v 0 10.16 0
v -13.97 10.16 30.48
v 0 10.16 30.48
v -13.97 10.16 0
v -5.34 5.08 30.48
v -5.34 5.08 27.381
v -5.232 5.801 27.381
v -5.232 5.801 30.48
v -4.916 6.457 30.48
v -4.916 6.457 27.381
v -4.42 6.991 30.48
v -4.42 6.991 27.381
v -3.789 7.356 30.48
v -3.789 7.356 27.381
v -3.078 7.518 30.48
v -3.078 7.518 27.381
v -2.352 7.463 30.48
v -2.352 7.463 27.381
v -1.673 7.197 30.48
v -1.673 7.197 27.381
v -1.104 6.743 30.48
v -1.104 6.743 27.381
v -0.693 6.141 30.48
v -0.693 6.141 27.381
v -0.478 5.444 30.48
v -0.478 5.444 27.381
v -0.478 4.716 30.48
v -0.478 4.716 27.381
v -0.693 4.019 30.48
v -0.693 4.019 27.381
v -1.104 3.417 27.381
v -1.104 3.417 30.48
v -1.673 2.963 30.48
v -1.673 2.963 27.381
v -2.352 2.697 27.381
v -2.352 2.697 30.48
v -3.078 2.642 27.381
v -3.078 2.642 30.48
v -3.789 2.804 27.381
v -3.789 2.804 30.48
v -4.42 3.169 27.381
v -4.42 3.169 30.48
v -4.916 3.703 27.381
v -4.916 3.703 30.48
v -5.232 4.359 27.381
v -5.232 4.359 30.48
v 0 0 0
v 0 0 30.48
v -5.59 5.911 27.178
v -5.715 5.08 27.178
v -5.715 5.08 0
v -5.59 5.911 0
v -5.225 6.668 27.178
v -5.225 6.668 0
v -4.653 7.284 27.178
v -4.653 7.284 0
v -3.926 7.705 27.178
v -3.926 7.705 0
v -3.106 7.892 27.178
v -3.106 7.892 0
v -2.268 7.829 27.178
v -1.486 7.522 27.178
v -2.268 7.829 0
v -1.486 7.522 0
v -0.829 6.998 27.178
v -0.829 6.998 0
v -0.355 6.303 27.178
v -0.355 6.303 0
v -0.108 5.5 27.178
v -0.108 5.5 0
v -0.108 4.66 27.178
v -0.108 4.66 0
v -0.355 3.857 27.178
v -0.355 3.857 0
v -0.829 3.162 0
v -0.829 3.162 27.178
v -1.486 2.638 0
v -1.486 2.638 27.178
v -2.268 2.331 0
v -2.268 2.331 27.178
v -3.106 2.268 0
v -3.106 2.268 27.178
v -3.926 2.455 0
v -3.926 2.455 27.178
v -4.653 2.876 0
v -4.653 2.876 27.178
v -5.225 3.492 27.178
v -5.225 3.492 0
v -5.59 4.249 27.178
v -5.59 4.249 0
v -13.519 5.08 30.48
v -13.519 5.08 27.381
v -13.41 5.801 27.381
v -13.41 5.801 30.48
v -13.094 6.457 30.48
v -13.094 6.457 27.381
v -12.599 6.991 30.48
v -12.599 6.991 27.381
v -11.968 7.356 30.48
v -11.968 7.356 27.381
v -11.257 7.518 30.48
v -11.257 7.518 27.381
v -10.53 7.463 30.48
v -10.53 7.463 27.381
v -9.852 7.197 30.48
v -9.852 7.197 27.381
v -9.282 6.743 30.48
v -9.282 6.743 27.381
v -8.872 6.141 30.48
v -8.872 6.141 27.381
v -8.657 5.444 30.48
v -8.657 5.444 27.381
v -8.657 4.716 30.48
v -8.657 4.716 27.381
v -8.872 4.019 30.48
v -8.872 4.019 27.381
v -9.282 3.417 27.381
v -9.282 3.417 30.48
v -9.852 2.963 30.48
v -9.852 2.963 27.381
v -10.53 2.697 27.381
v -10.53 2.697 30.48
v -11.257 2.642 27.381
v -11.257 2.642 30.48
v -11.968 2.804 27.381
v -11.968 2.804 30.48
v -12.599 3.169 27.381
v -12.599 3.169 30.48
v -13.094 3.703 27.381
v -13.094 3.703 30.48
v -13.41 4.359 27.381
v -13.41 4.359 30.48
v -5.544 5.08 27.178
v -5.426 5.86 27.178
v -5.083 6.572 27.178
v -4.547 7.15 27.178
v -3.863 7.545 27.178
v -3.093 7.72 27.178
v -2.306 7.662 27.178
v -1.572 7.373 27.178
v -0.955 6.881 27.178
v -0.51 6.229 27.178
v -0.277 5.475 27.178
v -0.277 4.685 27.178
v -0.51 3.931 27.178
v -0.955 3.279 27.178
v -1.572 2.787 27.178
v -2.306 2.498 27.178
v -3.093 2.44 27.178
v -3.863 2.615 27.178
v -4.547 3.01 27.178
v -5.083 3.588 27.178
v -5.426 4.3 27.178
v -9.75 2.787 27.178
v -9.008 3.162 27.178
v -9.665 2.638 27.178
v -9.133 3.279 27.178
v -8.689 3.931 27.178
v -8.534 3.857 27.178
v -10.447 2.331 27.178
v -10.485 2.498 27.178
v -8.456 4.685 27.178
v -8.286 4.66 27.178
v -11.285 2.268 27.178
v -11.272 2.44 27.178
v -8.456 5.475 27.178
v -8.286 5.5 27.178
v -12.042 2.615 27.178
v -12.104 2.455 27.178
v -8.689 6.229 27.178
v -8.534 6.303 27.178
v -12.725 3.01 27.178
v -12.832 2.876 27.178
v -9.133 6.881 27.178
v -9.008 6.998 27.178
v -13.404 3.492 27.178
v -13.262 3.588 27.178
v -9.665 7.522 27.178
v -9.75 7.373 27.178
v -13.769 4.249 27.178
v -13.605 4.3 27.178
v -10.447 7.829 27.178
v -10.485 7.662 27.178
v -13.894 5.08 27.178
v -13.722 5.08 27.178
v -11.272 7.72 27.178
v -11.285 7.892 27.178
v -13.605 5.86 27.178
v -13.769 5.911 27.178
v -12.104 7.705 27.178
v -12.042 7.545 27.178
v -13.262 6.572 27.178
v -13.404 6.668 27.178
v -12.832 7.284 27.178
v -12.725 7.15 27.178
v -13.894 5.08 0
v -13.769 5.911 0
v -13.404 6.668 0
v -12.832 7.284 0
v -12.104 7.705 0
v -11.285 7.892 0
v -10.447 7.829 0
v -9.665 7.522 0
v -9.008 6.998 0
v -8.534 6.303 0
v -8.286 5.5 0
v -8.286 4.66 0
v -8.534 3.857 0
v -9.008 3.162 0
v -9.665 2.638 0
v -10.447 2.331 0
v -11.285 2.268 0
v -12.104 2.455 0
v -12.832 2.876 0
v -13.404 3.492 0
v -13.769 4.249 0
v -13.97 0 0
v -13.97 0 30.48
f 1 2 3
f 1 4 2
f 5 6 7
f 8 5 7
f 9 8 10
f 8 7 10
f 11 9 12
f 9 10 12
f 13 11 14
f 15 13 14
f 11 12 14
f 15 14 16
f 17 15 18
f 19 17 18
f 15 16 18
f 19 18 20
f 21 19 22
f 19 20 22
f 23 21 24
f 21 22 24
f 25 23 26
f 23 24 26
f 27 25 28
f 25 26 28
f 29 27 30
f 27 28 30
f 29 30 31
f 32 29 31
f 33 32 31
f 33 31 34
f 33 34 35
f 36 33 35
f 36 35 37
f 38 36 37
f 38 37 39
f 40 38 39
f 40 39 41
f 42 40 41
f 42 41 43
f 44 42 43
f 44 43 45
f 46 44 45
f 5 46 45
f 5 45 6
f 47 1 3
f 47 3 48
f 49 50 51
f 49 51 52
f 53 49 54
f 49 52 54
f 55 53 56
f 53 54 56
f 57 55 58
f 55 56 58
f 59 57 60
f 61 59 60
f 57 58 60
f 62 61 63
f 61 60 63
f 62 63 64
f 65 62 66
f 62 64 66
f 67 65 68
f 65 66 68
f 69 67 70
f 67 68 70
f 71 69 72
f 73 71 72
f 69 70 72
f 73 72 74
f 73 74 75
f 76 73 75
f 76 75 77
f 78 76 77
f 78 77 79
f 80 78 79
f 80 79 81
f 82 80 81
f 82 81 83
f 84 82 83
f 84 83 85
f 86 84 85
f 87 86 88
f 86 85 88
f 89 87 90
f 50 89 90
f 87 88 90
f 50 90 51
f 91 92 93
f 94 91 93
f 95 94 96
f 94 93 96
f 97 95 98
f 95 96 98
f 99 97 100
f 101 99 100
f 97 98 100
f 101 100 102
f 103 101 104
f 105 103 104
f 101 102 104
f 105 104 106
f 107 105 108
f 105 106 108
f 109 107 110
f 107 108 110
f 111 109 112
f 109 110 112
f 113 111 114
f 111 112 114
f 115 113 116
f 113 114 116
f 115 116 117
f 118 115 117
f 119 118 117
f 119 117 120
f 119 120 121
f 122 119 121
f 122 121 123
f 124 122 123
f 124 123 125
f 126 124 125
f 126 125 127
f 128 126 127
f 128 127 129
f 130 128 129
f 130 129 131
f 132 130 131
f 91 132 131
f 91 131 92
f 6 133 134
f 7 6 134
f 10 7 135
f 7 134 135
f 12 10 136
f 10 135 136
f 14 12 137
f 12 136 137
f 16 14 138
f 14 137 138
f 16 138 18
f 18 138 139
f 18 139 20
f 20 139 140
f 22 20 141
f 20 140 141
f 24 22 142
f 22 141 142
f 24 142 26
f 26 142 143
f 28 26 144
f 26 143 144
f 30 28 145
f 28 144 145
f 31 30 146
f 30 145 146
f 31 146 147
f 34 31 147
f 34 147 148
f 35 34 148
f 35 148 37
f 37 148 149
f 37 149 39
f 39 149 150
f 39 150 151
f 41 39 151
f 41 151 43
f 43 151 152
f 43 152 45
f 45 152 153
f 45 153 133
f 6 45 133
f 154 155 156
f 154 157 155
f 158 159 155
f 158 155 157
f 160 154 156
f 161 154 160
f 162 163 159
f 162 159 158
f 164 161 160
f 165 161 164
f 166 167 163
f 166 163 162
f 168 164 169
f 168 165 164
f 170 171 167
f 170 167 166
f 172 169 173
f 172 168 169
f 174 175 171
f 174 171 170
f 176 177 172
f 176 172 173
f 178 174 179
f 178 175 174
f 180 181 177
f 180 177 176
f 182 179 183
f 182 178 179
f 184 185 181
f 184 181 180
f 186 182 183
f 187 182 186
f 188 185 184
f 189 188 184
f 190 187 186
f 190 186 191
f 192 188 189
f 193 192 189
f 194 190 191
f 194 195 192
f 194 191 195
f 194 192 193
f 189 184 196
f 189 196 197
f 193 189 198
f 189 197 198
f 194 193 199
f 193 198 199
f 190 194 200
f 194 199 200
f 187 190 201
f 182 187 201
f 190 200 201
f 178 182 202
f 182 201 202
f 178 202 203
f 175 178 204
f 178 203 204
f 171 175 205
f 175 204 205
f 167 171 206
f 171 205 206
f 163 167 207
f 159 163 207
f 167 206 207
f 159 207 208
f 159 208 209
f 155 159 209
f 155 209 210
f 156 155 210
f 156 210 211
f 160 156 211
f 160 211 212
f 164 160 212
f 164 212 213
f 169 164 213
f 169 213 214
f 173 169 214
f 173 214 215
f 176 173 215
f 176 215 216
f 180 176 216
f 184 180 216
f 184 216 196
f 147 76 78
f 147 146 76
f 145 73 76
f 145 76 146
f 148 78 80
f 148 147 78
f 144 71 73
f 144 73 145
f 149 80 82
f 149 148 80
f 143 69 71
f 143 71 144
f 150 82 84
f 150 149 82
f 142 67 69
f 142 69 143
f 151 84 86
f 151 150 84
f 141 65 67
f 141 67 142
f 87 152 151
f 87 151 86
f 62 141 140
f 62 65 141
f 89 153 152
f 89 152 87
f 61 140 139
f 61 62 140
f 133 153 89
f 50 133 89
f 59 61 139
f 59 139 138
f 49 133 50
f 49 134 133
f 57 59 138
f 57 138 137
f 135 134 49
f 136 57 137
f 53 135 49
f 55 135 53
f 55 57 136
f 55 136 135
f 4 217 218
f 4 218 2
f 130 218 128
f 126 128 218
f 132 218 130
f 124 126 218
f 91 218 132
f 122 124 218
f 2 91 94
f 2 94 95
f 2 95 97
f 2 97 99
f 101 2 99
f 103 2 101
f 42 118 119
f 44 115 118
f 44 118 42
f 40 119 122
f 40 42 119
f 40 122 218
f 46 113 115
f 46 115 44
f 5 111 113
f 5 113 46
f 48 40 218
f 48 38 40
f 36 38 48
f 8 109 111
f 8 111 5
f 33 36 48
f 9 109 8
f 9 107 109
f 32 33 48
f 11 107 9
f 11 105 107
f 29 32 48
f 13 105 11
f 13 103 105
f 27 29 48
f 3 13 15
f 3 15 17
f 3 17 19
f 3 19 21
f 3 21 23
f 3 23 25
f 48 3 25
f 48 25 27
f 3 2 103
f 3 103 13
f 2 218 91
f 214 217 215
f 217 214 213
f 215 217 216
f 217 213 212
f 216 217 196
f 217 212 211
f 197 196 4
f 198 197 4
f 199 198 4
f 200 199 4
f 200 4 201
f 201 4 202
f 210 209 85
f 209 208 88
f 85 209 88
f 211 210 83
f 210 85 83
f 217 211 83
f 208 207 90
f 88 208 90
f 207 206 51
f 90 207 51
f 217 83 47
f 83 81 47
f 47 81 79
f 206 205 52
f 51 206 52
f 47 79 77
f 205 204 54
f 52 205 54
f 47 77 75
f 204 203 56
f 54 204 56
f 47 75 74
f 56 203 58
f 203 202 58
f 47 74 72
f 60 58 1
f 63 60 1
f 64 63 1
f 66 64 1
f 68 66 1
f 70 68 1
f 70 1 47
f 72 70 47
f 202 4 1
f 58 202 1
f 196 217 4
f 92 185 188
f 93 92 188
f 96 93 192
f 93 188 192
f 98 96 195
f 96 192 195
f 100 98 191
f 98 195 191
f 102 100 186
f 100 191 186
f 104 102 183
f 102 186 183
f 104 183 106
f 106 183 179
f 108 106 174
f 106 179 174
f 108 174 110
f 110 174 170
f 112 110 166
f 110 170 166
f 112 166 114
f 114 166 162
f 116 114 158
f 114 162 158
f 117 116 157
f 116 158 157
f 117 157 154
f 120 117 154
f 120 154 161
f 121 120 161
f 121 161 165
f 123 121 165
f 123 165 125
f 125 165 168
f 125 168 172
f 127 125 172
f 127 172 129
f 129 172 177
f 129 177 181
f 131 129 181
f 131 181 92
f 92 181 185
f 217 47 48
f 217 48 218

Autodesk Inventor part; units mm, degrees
ref_plane "YZ Plane" through (0, 0, 0) normal (1, 0, 0) x (0, 1, 0)
ref_plane "XZ Plane" through (0, 0, 0) normal (0, 1, 0) x (-1, 0, 0)
ref_plane "XY Plane" through (0, 0, 0) normal (0, 0, 1) x (1, 0, 0)
sketch "Sketch1" plane through (0, 0, 0) normal (0, 0, 1) x (1, 0, 0)
  line L0 (-13.97, 10.16) -> (0, 10.16)
  line L1 (0, 10.16) -> (0, 0)
  line L2 (0, 0) -> (-13.97, 0)
  line L3 (-13.97, 0) -> (-13.97, 10.16)
  dimension "d0" = 13.97
  dimension "d1" = 10.16
extrude "Extrusion1" add sketch "Sketch1" along normal blind 30.48
sketch "Sketch2" plane through (0, 0, 0) normal (0, 0, -1) x (-1, 0, 0)
  line L0 (13.97, 10.16) -> (0, 10.16) projected
  line L1 (0, 10.16) -> (0, 0) projected
  line L2 (0, 0) -> (13.97, 0) projected
  line L3 (13.97, 0) -> (13.97, 10.16) projected
  circle A0 centre (2.8956, 5.08) radius 2.8194
  circle A1 centre (11.0744, 5.08) radius 2.8194
  dimension "d4" = 5.6388
  dimension "d5" = 5.6388
  dimension "d6" = 2.54
  dimension "d7" = 5.08
  dimension "d8" = 2.8956
  dimension "d9" = 2.8956
extrude "Extrusion2" cut sketch "Sketch2" against normal blind 27.178 contours A0 | A1
sketch "Sketch3" plane through (0, 0, 0) normal (0, 0, -1) x (-1, 0, 0)
  circle A0 centre (2.8956, 5.08) radius 2.8194 projected
  circle A1 centre (11.0744, 5.08) radius 2.8194 projected
  circle A2 centre (2.8956, 5.08) radius 2.4447
  circle A3 centre (11.0744, 5.08) radius 2.4447
  point P0 (0, 0)
  dimension "d12" = 4.8895
  dimension "d13" = 4.8895
extrude "Extrusion3" cut sketch "Sketch3" against normal blind 33.02 contours A2 | A3
chamfer "Chamfer1" distance 0.2032 angle 45 2 edges at (-0.4509, 5.08, 27.178) (-8.6297, 5.08, 27.178)
